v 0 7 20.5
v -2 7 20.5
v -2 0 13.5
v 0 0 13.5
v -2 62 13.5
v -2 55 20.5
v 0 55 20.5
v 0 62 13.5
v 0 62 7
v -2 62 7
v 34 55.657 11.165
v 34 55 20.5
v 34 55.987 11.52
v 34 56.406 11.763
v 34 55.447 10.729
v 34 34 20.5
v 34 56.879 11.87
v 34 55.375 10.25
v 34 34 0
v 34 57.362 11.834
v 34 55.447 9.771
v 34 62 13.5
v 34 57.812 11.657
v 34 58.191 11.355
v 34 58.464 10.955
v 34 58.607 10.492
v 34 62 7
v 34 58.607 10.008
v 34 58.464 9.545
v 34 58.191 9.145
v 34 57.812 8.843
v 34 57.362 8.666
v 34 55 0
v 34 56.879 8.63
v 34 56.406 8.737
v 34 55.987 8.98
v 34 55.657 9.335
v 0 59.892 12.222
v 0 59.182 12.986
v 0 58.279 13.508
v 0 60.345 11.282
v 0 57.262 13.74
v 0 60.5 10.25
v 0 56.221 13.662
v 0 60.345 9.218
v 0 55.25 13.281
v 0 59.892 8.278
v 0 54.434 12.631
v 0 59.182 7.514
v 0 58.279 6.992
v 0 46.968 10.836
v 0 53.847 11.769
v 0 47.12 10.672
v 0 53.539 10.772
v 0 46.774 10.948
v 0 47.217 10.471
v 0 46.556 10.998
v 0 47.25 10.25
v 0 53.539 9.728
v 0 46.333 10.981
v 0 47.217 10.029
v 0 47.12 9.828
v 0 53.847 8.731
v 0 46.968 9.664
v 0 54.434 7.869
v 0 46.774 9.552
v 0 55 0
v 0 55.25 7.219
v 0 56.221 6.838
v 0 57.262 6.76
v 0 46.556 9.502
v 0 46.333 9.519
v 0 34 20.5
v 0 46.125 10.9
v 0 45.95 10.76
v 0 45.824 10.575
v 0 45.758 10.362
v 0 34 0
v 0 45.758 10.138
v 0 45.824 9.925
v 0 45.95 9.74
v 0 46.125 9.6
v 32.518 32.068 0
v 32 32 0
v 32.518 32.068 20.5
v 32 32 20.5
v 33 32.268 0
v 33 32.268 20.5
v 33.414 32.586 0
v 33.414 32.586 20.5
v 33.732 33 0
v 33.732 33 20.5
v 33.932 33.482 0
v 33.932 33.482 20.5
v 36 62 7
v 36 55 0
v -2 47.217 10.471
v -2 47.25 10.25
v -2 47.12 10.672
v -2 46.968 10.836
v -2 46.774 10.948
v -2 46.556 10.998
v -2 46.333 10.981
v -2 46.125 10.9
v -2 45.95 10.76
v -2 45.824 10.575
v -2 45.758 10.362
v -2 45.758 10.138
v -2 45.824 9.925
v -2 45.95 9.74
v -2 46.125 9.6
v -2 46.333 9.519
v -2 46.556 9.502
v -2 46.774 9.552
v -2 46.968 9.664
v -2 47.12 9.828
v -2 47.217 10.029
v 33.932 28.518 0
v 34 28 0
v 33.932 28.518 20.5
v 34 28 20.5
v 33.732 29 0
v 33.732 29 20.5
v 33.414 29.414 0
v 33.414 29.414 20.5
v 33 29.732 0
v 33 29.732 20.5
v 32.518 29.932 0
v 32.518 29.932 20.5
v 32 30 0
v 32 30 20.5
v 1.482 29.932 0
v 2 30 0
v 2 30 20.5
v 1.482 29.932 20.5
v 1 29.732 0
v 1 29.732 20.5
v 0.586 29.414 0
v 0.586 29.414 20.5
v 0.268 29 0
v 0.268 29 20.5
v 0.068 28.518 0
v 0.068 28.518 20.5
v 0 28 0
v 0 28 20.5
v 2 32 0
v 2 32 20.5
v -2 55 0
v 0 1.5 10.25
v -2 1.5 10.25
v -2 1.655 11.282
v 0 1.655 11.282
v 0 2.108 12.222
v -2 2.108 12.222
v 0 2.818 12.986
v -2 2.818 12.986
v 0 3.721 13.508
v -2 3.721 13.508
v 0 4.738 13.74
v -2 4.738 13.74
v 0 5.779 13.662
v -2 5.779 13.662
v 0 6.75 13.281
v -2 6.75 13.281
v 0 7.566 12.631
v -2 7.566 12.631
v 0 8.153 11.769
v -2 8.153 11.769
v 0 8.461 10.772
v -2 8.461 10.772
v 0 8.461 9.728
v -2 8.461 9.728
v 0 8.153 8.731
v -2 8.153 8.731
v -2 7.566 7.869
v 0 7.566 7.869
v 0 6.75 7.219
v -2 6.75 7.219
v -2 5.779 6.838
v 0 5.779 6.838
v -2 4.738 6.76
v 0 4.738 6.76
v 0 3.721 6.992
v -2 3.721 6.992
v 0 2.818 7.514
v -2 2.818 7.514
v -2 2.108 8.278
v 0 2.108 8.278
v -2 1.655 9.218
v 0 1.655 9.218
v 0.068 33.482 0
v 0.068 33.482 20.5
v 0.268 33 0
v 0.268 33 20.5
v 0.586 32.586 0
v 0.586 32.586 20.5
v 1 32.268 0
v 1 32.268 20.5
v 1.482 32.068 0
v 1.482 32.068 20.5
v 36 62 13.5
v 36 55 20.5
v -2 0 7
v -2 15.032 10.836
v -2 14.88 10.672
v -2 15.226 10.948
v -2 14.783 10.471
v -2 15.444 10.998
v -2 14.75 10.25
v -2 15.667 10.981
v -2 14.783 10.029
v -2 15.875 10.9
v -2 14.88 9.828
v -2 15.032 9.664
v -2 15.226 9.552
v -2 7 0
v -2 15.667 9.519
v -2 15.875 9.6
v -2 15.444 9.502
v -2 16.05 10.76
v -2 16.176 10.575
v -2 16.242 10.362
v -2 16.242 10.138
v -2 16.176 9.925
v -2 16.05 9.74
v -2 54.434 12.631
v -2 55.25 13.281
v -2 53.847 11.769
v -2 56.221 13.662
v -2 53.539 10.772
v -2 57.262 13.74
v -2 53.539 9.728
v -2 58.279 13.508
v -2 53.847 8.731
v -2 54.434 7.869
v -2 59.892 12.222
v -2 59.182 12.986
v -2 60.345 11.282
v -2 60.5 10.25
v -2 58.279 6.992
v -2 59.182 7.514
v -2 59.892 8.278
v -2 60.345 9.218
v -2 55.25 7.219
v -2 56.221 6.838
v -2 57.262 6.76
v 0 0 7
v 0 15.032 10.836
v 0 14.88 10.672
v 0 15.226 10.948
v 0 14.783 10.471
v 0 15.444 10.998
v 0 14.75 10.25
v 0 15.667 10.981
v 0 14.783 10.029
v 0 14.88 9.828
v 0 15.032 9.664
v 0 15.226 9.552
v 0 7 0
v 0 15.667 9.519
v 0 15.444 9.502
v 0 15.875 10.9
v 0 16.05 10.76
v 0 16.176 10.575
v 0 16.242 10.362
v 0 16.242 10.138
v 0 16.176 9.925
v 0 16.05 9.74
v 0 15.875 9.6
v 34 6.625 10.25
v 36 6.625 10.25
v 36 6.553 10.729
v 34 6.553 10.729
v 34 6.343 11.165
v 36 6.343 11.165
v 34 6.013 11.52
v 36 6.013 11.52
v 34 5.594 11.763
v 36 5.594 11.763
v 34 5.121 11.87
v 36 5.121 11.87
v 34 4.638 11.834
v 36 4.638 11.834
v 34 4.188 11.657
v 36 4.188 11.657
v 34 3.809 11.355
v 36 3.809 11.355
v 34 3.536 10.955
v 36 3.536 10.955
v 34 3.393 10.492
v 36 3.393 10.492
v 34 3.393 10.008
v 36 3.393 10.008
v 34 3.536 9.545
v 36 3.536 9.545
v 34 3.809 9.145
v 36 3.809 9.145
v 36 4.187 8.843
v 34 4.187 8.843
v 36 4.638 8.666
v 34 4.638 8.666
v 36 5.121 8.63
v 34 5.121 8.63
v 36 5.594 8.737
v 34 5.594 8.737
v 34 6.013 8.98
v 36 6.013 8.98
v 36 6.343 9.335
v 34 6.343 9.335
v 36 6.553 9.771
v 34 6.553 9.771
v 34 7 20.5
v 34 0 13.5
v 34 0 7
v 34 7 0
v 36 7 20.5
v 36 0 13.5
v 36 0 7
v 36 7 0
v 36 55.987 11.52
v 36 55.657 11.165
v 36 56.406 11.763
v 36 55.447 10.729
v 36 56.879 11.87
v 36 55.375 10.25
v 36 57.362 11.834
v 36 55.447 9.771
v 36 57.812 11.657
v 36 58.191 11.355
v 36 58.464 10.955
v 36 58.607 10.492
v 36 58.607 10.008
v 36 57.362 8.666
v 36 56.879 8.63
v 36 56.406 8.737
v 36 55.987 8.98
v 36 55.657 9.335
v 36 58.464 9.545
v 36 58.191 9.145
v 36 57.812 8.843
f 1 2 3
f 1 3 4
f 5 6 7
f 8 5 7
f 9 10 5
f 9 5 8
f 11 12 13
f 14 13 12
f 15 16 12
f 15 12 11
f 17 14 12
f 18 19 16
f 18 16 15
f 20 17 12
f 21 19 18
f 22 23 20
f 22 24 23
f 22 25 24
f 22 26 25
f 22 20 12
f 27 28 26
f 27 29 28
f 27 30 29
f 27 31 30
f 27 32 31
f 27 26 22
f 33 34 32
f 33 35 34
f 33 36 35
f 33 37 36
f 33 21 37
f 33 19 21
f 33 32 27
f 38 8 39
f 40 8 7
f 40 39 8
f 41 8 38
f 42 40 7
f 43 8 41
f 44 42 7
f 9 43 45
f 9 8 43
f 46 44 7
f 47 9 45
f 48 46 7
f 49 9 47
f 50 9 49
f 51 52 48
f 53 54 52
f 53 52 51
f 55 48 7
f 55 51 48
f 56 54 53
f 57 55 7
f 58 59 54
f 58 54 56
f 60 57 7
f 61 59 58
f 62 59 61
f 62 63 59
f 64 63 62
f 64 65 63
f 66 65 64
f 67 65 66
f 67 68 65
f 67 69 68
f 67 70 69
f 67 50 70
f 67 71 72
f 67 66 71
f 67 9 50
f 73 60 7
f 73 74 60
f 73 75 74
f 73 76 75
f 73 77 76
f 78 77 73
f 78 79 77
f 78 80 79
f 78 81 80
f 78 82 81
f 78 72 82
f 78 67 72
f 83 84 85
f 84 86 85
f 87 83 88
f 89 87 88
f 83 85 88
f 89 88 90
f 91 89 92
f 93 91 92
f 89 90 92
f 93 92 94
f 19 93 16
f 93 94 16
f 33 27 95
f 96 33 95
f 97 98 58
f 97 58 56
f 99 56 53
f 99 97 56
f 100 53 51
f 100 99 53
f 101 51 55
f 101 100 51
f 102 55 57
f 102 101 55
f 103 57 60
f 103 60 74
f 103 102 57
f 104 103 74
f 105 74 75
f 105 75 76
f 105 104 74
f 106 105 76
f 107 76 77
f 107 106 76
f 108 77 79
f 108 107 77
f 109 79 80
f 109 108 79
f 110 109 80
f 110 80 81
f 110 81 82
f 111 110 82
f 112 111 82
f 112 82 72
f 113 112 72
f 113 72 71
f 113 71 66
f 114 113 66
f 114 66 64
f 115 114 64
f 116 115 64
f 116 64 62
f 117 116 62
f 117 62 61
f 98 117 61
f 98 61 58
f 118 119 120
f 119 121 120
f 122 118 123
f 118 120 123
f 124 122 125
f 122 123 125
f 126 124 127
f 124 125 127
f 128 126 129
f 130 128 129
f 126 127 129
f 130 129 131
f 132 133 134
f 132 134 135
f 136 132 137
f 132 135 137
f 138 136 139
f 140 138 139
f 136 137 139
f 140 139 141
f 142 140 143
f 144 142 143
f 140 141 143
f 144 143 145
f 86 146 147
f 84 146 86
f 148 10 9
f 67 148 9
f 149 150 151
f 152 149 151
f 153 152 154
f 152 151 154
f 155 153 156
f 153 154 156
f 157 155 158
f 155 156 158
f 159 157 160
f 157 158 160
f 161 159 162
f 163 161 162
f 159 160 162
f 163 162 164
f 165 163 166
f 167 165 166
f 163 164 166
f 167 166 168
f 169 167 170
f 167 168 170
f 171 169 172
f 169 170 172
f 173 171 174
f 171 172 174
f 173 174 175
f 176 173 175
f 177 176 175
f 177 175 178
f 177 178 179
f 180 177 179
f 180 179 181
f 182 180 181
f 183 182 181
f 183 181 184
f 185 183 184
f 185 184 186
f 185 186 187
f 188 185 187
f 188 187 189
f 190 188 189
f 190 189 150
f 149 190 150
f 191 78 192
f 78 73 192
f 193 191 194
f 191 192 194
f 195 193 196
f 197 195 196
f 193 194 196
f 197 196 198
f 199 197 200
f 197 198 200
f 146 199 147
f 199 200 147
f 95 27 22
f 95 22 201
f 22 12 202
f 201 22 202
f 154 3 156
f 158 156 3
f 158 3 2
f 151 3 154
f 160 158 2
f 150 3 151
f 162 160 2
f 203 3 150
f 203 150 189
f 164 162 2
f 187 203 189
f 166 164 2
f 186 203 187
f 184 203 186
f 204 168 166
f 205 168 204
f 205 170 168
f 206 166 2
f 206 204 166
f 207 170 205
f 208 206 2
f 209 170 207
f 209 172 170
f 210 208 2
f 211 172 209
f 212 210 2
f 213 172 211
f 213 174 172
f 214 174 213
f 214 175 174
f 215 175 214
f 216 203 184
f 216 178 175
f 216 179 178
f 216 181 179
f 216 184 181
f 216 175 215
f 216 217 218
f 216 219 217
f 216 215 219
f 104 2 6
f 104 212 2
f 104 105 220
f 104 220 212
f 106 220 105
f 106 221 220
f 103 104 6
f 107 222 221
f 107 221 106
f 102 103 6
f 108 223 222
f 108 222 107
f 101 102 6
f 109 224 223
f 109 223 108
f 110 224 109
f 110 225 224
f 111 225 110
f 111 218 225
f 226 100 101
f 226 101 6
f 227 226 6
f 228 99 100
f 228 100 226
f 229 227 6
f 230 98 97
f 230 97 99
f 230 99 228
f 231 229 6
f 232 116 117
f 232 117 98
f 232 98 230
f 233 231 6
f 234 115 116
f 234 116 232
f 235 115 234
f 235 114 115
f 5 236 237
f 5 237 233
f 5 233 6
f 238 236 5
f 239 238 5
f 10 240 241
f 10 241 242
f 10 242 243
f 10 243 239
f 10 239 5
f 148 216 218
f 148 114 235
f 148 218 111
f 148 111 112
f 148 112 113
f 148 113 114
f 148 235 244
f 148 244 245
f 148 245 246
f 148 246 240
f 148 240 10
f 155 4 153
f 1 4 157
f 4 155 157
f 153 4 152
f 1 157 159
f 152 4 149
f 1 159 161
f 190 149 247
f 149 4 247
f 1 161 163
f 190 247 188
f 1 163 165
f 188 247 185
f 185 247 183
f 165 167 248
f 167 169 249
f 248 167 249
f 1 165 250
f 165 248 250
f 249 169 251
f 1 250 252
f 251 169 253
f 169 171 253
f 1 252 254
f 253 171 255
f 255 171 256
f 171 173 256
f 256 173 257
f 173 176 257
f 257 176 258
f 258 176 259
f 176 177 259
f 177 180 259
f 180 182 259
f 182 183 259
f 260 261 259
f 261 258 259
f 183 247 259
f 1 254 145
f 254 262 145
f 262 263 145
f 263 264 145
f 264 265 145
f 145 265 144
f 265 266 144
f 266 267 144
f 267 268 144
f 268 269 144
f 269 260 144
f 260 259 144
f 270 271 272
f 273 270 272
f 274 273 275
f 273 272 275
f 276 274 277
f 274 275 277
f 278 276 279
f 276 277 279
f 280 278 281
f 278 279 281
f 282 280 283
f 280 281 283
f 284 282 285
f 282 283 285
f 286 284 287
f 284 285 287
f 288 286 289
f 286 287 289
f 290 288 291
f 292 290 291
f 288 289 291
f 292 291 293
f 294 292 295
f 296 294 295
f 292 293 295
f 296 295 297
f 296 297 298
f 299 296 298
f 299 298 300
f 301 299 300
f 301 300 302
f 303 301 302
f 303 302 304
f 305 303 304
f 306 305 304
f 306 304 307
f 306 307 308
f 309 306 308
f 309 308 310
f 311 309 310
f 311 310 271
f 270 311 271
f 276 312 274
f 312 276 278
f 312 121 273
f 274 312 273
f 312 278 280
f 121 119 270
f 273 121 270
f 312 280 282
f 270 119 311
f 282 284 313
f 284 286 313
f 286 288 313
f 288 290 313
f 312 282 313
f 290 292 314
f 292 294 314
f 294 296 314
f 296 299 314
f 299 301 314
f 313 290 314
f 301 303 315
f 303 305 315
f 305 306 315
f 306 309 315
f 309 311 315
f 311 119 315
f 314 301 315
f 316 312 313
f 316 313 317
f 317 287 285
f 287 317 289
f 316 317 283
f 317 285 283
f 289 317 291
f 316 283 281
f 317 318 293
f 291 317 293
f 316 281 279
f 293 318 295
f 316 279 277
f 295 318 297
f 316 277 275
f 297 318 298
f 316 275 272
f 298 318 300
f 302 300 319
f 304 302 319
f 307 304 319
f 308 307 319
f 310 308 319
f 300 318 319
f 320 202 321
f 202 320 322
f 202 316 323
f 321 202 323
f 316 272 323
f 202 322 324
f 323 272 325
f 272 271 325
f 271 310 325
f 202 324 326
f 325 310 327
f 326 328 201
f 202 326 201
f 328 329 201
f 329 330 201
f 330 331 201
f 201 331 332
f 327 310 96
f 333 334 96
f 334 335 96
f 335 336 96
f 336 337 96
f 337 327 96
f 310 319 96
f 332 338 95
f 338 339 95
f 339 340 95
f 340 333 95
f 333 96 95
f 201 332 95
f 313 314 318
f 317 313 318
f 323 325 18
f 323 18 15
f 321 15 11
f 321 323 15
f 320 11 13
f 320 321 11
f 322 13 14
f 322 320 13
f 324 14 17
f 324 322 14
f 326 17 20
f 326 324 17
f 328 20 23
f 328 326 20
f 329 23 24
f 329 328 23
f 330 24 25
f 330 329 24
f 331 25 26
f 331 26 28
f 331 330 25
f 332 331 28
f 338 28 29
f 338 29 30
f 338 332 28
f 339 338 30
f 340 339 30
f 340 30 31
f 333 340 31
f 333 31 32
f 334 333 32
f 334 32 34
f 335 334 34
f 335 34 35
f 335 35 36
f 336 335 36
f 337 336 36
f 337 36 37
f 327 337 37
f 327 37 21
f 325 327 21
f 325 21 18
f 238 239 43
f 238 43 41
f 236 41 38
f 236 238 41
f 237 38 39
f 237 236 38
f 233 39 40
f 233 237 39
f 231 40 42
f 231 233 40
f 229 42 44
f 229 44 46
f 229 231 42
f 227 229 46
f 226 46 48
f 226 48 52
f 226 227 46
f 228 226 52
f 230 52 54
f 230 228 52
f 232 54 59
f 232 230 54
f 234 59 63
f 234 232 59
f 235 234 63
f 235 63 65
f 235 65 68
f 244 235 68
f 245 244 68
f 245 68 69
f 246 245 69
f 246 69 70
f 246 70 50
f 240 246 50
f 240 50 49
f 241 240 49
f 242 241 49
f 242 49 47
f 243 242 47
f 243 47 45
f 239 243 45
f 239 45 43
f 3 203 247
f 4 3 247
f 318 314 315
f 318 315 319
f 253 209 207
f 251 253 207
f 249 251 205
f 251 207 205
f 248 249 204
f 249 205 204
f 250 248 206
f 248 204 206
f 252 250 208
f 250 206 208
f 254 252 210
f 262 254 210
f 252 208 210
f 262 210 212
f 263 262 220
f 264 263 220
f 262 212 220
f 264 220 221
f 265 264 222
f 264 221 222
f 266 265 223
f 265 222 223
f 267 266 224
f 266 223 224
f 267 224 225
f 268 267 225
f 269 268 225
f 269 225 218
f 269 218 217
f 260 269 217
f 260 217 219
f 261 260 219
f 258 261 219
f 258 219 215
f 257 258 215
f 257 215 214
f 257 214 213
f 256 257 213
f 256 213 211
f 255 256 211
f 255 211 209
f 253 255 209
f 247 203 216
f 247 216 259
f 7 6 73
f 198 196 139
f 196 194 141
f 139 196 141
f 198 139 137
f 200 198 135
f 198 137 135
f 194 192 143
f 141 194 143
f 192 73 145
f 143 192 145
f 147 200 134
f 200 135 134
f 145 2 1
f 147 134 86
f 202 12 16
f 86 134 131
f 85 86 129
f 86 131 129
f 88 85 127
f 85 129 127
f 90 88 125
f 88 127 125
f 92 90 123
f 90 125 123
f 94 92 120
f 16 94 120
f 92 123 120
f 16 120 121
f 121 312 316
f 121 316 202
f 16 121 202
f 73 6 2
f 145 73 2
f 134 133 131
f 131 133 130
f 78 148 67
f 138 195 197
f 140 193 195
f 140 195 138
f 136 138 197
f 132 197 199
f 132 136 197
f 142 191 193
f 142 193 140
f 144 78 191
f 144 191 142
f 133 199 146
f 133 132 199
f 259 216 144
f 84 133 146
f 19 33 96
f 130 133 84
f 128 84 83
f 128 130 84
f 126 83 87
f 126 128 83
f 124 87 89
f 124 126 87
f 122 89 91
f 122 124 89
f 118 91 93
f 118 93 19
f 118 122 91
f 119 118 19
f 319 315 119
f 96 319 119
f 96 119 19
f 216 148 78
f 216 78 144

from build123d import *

# Parameters (mm, degrees)
F1_DEPTH = 20.5
F2_SIZE  = 7
F3_R     = 3.5
F3_R_2   = 0.75
F4_DEPTH = 25
F5_R     = 1.625
F6_DEPTH = 25
F9_R     = 2


with BuildPart() as f1:
    # F0 (on Top) → F1 (new body)
    with BuildSketch(Plane.XY):
        Polygon((-2, 0), (0, 0), (0, 30), (34, 30), (34, 0), (36, 0), (36, 32), (-2, 32), align=None)
    extrude(amount=F1_DEPTH)

    # F2
    f2_edges = [f1.edges().sort_by_distance(p)[0] for p in [
        (-1, 0, 0),
        (-1, 0, 20.5),
        (35, 0, 0),
        (35, 0, 20.5),
    ]]
    chamfer(f2_edges, length=F2_SIZE)

    # F3 (on face) → F4 (cut)
    with BuildSketch(Plane(origin=(-2, 0, 0), x_dir=(0, -1, 0), z_dir=(-1, 0, 0))):
        with Locations((-5, 10.25)):
            Circle(F3_R)
        with Locations((-15.5, 10.25)):
            Circle(F3_R_2)
    extrude(amount=-F4_DEPTH, mode=Mode.SUBTRACT)

    # F5 (on face) → F6 (cut)
    with BuildSketch(Plane.YZ.offset(36)):
        with Locations((5, 10.25)):
            Circle(F5_R)
    extrude(amount=-F6_DEPTH, mode=Mode.SUBTRACT)

    # F8: F1 across plane


with BuildPart() as f1_1:
    add(f1.part)
    add(f1.part.mirror(Plane(origin=(17, 31, 10.25), x_dir=(-1, 0, 0), z_dir=(0, 1, 0))))

    # F9
    f9_edges = [f1_1.edges().sort_by_distance(p)[0] for p in [
        (0, 30, 10.25),
        (0, 32, 10.25),
        (34, 32, 10.25),
        (34, 30, 10.25),
    ]]
    fillet(f9_edges, radius=F9_R)


solid = f1_1.part
